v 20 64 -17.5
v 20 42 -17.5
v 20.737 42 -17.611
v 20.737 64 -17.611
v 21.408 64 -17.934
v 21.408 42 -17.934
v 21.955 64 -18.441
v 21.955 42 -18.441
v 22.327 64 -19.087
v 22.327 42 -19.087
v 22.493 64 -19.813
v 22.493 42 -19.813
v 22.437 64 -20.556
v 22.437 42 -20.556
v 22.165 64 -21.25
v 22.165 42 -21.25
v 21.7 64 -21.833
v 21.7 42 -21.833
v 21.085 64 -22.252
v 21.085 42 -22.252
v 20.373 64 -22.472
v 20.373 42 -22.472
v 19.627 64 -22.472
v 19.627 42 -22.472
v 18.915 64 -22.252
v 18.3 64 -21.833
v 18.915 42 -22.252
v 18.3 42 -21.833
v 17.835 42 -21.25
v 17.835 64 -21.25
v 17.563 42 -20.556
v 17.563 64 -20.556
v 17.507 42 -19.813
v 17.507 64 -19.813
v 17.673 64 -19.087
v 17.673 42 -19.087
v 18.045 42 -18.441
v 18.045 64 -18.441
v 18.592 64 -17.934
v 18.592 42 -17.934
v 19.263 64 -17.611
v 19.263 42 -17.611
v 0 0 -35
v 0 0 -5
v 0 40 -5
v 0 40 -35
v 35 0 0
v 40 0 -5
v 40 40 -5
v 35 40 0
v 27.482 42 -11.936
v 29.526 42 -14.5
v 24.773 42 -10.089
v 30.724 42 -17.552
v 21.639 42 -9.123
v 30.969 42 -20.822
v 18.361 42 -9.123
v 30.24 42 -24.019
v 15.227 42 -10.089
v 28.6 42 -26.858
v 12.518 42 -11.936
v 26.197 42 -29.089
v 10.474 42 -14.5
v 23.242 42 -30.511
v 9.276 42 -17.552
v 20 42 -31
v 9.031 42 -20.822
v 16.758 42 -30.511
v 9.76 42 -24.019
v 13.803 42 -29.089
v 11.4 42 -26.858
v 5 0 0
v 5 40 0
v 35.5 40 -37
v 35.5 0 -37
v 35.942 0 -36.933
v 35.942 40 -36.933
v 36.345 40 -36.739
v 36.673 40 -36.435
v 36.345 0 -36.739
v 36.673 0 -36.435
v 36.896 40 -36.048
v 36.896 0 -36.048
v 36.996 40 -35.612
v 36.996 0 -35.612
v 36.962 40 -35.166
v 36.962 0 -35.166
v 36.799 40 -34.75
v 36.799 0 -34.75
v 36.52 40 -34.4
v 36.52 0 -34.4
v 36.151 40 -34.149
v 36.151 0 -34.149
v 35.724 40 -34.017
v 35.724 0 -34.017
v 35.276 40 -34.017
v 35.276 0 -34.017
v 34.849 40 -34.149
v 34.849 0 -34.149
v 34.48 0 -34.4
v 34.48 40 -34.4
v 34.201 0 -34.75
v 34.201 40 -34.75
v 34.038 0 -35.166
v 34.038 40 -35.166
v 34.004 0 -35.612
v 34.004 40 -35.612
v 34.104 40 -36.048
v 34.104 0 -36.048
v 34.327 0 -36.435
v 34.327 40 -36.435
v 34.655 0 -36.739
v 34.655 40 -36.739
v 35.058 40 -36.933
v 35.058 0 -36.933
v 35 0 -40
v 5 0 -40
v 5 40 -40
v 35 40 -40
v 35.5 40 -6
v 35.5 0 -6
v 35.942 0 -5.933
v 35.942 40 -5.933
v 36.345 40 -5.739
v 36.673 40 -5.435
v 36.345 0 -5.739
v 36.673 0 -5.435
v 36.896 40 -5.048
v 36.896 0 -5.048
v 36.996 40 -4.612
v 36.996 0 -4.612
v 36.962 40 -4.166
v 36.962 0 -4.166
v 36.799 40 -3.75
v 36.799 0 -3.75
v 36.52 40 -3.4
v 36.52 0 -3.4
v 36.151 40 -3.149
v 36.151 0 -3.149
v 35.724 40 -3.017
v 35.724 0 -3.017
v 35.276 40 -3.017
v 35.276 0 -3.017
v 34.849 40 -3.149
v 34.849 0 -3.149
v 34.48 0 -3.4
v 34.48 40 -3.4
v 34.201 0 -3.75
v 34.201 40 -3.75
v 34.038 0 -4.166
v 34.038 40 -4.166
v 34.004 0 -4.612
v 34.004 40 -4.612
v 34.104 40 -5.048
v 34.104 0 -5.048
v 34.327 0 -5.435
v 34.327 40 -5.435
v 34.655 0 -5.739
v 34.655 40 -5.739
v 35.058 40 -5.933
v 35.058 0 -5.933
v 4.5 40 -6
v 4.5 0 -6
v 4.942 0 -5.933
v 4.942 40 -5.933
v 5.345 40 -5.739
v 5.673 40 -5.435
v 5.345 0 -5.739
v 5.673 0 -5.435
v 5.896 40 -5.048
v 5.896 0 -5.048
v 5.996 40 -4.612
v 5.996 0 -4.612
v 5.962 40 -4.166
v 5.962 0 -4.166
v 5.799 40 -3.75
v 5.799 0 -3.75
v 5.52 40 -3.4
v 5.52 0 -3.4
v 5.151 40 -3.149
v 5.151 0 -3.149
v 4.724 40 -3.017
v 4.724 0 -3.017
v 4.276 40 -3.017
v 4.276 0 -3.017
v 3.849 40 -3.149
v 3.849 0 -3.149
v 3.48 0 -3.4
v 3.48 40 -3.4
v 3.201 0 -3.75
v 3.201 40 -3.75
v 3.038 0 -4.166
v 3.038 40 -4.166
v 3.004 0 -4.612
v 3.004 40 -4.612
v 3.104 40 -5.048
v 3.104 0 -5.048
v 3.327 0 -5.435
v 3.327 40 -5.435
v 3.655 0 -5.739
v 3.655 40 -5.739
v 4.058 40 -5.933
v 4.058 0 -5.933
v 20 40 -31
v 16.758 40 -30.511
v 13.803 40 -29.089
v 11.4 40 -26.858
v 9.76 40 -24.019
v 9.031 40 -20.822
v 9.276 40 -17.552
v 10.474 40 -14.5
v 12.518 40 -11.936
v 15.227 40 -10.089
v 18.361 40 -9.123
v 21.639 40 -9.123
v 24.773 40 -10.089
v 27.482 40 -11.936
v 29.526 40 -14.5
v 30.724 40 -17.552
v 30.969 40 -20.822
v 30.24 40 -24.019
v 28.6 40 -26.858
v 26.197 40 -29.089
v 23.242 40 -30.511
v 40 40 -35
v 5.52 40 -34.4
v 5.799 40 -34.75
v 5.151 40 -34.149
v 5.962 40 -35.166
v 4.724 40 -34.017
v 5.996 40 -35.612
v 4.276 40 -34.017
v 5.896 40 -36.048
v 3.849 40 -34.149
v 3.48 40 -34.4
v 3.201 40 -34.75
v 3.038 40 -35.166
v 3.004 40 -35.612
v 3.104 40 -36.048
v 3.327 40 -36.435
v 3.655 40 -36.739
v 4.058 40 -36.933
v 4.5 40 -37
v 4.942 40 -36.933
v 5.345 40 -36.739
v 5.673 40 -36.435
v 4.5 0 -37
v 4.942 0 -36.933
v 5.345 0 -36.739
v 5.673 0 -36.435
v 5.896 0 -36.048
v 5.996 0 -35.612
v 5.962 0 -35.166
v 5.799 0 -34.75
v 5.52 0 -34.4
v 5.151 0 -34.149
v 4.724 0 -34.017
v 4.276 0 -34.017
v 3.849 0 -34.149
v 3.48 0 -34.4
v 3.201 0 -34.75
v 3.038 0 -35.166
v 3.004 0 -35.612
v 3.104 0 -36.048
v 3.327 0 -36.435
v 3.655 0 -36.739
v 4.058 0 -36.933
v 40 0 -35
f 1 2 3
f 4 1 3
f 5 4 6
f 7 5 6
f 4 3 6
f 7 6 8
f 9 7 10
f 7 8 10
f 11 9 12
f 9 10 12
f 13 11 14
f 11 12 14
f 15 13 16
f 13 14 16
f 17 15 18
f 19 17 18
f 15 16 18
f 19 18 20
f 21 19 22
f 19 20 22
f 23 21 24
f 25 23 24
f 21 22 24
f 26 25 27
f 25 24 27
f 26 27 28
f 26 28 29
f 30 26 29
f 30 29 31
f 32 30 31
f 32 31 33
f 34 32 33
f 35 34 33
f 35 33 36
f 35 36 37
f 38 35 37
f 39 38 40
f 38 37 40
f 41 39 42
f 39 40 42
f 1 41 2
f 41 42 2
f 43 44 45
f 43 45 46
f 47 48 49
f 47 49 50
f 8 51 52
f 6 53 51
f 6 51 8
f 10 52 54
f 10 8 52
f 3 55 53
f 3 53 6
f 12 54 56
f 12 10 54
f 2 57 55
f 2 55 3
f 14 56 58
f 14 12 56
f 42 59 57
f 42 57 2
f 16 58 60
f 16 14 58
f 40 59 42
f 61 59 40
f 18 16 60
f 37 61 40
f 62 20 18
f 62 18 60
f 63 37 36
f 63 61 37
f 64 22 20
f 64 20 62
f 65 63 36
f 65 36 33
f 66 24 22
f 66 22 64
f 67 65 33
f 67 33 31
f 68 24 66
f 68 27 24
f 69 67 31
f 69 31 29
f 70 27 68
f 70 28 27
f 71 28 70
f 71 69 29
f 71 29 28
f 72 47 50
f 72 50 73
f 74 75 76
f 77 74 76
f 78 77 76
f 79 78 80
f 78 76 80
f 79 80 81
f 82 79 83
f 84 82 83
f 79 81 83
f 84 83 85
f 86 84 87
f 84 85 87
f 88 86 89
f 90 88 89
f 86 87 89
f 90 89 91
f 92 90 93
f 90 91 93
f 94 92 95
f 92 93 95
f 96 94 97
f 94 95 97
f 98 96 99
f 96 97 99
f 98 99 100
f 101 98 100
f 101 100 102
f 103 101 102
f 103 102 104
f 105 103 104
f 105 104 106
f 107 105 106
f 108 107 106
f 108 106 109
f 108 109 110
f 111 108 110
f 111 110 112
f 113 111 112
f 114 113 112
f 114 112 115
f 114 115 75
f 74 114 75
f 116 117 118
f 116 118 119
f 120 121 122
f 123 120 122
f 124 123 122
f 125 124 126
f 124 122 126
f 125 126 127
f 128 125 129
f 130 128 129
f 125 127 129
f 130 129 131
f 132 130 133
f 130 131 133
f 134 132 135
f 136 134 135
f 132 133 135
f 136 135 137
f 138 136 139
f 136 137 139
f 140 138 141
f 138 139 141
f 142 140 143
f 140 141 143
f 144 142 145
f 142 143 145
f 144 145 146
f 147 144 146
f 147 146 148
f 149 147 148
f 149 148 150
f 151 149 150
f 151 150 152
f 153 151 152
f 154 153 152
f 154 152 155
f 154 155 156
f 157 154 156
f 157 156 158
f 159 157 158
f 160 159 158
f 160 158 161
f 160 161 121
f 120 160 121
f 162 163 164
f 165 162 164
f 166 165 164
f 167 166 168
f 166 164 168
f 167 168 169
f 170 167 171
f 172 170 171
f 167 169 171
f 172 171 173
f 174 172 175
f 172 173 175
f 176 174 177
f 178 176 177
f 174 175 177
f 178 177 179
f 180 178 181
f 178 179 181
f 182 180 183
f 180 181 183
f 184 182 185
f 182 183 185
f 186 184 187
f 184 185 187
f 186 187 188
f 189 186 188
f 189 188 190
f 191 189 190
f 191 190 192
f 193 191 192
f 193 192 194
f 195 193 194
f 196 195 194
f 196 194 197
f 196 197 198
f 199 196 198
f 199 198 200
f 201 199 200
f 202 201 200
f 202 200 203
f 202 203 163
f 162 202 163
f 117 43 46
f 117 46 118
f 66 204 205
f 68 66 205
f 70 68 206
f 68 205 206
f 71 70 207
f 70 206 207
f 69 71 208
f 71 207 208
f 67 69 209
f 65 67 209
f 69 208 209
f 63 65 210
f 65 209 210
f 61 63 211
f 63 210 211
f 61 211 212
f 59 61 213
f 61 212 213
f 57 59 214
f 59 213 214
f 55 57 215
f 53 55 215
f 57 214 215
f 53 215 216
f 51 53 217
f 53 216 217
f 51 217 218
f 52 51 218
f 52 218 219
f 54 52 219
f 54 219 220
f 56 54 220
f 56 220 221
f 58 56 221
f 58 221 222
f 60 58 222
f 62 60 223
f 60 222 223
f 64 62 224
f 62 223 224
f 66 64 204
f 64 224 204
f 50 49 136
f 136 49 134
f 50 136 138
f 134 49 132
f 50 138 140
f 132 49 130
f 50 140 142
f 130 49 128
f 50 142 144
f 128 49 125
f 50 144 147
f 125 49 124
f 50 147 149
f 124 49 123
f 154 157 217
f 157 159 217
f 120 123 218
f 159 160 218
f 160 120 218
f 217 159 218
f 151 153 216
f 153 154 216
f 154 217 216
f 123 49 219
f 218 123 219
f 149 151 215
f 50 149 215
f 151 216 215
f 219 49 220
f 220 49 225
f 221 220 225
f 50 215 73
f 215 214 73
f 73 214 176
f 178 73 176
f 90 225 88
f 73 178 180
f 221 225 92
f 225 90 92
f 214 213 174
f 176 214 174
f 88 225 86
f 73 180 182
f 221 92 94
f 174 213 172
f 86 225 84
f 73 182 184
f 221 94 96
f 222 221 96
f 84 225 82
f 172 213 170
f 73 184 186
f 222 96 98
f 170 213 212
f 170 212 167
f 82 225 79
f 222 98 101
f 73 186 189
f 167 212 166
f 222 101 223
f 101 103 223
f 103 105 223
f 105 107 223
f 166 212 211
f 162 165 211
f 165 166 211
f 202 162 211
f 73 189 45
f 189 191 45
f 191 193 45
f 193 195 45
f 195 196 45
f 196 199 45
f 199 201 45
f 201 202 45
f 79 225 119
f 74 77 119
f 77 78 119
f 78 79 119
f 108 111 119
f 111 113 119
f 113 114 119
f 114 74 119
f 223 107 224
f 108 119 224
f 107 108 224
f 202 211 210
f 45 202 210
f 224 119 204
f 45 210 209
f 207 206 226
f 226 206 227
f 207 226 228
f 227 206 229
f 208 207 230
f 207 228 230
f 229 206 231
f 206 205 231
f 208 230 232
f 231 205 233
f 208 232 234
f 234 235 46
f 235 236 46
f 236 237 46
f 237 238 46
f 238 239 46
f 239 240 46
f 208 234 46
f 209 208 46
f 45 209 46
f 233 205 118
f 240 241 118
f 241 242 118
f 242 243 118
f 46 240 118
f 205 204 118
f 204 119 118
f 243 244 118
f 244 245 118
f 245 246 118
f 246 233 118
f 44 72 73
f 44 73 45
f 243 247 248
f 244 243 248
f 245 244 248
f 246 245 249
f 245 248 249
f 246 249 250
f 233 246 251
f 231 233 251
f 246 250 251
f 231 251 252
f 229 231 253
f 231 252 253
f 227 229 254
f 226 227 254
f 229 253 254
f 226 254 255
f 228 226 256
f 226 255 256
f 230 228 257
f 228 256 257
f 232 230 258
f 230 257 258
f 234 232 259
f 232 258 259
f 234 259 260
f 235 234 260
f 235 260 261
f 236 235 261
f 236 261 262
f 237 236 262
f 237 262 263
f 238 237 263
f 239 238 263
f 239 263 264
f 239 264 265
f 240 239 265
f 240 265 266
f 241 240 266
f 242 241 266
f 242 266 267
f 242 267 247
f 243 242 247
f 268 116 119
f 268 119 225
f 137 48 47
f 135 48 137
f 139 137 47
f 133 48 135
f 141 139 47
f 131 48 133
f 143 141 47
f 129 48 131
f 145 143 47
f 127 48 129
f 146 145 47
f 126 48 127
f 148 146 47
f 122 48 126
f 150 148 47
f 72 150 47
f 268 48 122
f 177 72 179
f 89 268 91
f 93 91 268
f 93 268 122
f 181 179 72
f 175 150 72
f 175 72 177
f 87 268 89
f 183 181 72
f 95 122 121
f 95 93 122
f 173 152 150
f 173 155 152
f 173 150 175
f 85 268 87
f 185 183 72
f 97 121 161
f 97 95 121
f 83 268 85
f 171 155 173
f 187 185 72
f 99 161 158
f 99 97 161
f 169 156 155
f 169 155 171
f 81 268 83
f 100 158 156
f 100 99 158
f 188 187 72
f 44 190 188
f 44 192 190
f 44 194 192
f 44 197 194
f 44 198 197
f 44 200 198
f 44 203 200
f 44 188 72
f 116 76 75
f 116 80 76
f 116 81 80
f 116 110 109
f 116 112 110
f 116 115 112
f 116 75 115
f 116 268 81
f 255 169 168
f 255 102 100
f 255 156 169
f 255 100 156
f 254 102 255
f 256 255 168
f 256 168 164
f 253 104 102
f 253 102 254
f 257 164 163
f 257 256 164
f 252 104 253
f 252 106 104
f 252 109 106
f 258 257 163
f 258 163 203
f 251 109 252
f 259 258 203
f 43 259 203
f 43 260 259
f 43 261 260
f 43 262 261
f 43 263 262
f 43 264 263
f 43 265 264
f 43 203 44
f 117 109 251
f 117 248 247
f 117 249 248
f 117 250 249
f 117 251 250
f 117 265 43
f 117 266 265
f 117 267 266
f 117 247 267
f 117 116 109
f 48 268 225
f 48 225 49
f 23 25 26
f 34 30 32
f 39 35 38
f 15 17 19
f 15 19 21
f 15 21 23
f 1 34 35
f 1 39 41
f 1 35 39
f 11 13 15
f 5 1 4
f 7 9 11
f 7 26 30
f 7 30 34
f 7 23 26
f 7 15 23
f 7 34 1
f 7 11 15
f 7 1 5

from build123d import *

# Parameters (mm, degrees)
BOSS_EXTRUDE1_DEPTH  = 40
SKETCH2_R            = 11
BOSS_EXTRUDE2_DEPTH  = 2
SKETCH3_R            = 2.5
BOSS_EXTRUDE3_DEPTH  = 22
SKETCH4_R            = 1.5
CUT_EXTRUDE1_DEPTH   = 86.416626016
LPATTERN1_COUNT      = 2
LPATTERN1_PITCH      = 31
LPATTERN1_COUNT_DIR2 = 2
LPATTERN1_PITCH_DIR2 = 31


with BuildPart() as part:
    # Sketch1 → Boss-Extrude1 (new body)
    with BuildSketch(Plane(origin=(0, 0, 0), x_dir=(1, 0, 0), z_dir=(0, 1, 0))):
        Polygon((0, 35), (5, 40), (35, 40), (40, 35), (40, 5), (35, 0), (5, 0), (0, 5), align=None)
    extrude(amount=BOSS_EXTRUDE1_DEPTH)

    # Sketch2 → Boss-Extrude2 (add)
    with BuildSketch(Plane(origin=(0, 40, 0), x_dir=(1, 0, 0), z_dir=(0, 1, 0))):
        with Locations(Location((20, 20, 0), (0, 0, 90))):
            Circle(SKETCH2_R)
    extrude(amount=BOSS_EXTRUDE2_DEPTH)

    # Sketch3 → Boss-Extrude3 (add)
    with BuildSketch(Plane(origin=(0, 42, 0), x_dir=(1, 0, 0), z_dir=(0, 1, 0))):
        with Locations(Location((20, 20, 0), (0, 0, 270))):
            Circle(SKETCH3_R)
    extrude(amount=BOSS_EXTRUDE3_DEPTH)

    # Sketch4 → Cut-Extrude1 (cut, through all)
    with BuildSketch(Plane.XZ):
        with Locations(Location((4.5, -4.5, 0), (0, 0, 270))):
            Circle(SKETCH4_R)
    cut_extrude1 = extrude(amount=-CUT_EXTRUDE1_DEPTH, mode=Mode.SUBTRACT)

    # LPattern1: Cut-Extrude1 2 × 2
    with Locations(*[(i * LPATTERN1_PITCH, 0, -j * LPATTERN1_PITCH_DIR2) for i in range(LPATTERN1_COUNT) for j in range(LPATTERN1_COUNT_DIR2) if (i, j) != (0, 0)]):
        add(cut_extrude1, mode=Mode.SUBTRACT)


solid = part.part
